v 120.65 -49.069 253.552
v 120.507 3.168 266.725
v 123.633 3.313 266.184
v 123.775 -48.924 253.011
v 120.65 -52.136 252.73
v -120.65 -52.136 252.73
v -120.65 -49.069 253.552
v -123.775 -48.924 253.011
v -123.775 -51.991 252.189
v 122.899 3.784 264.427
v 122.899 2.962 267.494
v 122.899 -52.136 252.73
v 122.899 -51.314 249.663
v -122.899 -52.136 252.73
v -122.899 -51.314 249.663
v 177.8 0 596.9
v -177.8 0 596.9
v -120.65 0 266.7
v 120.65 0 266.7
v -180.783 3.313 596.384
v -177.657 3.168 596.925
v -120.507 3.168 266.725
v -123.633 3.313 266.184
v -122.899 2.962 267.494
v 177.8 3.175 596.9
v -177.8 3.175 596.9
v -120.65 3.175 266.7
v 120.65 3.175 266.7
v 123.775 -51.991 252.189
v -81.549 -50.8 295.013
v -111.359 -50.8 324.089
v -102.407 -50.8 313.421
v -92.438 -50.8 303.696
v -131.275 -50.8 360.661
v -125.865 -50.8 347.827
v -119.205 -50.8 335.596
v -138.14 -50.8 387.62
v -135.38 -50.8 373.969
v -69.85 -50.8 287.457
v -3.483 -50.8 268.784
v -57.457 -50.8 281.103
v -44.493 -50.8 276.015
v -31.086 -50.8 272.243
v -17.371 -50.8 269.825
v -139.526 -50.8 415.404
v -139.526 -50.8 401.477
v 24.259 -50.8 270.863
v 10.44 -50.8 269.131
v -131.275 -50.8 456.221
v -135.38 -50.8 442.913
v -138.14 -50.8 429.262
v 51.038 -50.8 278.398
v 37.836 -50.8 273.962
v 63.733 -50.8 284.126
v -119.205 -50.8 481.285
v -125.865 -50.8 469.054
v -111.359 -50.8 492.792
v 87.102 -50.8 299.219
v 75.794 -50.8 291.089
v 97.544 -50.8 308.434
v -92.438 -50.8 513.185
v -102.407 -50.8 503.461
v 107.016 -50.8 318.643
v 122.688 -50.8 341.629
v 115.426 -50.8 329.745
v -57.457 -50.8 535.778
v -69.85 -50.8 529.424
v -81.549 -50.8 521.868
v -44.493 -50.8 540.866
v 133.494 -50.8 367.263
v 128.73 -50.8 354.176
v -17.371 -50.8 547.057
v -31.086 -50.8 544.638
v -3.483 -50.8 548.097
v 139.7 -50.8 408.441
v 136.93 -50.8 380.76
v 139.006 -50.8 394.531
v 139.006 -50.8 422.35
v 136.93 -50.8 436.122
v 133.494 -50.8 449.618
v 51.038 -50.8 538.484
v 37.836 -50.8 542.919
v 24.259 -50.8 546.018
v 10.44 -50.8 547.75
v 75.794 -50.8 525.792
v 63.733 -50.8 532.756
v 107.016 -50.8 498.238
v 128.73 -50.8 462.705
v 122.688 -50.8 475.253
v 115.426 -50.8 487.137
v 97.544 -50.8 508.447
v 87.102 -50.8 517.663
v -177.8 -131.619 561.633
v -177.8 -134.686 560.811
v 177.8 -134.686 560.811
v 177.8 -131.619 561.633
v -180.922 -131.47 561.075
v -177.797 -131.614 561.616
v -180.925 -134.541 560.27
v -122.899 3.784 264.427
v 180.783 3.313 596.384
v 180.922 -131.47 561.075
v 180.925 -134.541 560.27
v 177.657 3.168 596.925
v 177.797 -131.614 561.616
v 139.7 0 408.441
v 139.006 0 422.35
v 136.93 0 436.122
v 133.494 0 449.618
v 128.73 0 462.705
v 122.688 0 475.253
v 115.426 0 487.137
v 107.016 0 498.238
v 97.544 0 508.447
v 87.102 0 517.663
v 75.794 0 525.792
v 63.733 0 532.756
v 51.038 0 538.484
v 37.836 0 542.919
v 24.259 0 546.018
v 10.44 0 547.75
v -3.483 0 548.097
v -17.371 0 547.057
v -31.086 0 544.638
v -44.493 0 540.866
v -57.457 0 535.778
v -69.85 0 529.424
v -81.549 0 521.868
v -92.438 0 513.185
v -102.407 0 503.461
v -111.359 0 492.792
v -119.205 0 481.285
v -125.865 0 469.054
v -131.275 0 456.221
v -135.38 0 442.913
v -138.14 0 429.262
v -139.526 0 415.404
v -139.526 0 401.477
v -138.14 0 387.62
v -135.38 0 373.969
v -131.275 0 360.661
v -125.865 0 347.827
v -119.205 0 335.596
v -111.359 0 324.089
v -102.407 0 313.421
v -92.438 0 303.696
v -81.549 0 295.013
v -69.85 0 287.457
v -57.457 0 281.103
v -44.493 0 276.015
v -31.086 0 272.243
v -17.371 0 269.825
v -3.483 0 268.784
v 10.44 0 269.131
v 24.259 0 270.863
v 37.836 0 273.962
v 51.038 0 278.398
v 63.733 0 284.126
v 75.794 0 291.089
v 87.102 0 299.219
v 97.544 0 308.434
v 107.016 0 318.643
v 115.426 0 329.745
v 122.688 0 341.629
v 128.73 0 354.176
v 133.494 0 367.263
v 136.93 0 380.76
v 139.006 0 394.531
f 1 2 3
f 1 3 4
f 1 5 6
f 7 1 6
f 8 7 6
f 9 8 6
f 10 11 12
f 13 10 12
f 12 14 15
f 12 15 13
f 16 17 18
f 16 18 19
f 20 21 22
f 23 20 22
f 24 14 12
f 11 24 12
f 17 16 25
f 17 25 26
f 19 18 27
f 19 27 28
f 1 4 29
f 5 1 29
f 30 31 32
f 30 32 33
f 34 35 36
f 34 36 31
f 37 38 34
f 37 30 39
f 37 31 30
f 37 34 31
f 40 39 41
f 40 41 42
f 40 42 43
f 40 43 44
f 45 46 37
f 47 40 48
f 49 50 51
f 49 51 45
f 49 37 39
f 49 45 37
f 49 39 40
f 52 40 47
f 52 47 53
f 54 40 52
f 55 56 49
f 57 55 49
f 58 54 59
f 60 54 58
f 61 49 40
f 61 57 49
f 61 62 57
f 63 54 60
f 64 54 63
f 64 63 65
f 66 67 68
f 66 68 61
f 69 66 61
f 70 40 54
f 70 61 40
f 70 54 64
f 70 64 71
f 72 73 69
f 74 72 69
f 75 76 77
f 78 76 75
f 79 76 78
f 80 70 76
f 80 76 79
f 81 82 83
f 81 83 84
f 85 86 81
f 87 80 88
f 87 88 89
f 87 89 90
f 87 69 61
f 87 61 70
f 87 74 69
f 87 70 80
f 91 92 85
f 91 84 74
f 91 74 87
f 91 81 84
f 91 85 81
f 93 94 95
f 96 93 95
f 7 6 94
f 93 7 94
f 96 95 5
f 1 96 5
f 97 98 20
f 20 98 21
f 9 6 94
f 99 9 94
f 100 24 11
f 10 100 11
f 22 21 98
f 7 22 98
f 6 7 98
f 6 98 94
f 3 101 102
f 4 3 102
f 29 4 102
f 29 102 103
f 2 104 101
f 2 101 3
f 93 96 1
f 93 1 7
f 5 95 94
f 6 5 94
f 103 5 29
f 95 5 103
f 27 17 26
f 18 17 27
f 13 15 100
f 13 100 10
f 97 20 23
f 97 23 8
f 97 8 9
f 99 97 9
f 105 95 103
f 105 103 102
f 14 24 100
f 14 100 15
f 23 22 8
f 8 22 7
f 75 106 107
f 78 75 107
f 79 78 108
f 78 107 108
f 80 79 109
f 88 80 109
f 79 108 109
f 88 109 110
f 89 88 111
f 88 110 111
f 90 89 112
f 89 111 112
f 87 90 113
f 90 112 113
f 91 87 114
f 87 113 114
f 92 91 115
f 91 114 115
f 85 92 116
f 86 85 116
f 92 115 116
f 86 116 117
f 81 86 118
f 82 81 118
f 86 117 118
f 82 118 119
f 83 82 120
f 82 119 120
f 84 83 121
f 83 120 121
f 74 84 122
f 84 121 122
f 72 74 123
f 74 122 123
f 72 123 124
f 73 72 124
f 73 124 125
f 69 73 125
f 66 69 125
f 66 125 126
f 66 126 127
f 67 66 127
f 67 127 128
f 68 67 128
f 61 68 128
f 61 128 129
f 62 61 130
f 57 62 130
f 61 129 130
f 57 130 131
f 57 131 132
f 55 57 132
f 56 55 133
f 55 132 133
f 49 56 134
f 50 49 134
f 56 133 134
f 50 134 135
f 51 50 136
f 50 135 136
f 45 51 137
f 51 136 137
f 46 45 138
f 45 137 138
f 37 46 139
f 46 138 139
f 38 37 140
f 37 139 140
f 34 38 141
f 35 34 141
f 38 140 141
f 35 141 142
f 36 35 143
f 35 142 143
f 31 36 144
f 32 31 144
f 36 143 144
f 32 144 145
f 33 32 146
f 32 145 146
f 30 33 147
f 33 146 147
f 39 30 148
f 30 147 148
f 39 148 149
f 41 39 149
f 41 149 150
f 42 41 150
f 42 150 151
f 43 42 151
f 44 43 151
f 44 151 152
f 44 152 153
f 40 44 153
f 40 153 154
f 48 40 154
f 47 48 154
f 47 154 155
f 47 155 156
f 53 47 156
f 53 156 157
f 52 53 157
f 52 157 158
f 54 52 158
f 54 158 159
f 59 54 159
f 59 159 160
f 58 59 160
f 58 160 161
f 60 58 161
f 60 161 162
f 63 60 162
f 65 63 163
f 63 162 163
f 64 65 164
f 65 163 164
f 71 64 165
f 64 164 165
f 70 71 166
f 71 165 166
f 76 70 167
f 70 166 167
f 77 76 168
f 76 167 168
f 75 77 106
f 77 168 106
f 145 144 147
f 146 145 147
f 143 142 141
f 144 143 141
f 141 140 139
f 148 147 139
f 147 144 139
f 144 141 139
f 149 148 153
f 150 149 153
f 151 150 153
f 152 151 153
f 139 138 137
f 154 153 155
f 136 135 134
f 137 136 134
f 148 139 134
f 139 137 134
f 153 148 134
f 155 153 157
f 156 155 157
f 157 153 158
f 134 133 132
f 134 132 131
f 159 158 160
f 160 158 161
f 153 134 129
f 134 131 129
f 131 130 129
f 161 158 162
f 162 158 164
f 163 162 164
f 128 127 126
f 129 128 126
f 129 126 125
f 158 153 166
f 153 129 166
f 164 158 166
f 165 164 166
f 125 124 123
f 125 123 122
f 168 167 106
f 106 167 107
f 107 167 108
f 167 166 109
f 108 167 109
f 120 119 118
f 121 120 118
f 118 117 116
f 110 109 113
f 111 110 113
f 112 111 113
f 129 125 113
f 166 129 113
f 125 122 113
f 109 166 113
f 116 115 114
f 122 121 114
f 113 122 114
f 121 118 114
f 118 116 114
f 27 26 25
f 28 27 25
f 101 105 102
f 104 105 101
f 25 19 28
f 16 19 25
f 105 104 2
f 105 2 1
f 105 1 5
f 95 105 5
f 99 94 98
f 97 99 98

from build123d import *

# Parameters (mm, degrees)
F2_DEPTH  = 3.175
F3_R      = 139.7
F4_DEPTH  = 50.8
F8_DEPTH  = 3.175
F10_DEPTH = 3.175
F12_W     = 245.7978874445
F12_H     = 57.0418144985
F13_DEPTH = 3.175


with BuildPart() as f2:
    # F1 (on Front) → F2 (new body)
    with BuildSketch(Plane.XZ):
        Polygon((120.65, 266.7), (177.8, 596.9), (-177.8, 596.9), (-120.65, 266.7), align=None)
    extrude(amount=-F2_DEPTH)


with BuildPart() as f4:
    # F3 (on face) → F4 (new body)
    with BuildSketch(Plane.XZ):
        with Locations((0, 408.4407389164)):
            Circle(F3_R)
    extrude(amount=F4_DEPTH)


with BuildPart() as f8:
    # F7 (on face) → F8 (new body)
    with BuildSketch(Plane(origin=(0, 14.539153526, 3.8957544459), x_dir=(-1, 0, 0), z_dir=(0, 0.9659258263, 0.2588190451))):
        Polygon((120.65, 257.6124178713), (177.8, 576.5611257119), (-177.8, 576.5611257119), (-120.65, 257.6124178713), align=None)
    extrude(amount=F8_DEPTH)


with BuildPart() as f10:
    # F9 (on face) → F10 (new body)
    with BuildSketch(Plane(origin=(-72.1731684636, 3.347089997, -12.4915099264), x_dir=(-0.0449800713, -0.99895755, -0.0077850123), z_dir=(-0.9843233273, 0.0456488032, -0.1703636528))):
        Polygon((135.102368204, 583.7099916129), (0.1788925906, 618.477983858), (0.1788925906, 283.3688038882), (52.4708201773, 270.4134080558), align=None)
        Polygon((138.1769790582, 582.9177051272), (135.102368204, 583.7099916129), (52.4708201773, 270.4134080558), (55.5408350126, 269.6036958163), align=None)
    extrude(amount=F10_DEPTH)


with BuildPart() as f11_1:
    # F11: instance of F10
    add(f10.part.mirror(Plane.YZ))


with BuildPart() as f13:
    # F12 (on face) → F13 (new body)
    with BuildSketch(Plane(origin=(0, -66.675, 248.8344875947), x_dir=(1, 0, 0), z_dir=(0, 0.2588190451, -0.9659258263))):
        with Locations((0, -43.5729465781)):
            Rectangle(F12_W, F12_H)
    extrude(amount=F13_DEPTH)


solid = Compound([f2.part, f4.part, f8.part, f10.part, f11_1.part, f13.part])
